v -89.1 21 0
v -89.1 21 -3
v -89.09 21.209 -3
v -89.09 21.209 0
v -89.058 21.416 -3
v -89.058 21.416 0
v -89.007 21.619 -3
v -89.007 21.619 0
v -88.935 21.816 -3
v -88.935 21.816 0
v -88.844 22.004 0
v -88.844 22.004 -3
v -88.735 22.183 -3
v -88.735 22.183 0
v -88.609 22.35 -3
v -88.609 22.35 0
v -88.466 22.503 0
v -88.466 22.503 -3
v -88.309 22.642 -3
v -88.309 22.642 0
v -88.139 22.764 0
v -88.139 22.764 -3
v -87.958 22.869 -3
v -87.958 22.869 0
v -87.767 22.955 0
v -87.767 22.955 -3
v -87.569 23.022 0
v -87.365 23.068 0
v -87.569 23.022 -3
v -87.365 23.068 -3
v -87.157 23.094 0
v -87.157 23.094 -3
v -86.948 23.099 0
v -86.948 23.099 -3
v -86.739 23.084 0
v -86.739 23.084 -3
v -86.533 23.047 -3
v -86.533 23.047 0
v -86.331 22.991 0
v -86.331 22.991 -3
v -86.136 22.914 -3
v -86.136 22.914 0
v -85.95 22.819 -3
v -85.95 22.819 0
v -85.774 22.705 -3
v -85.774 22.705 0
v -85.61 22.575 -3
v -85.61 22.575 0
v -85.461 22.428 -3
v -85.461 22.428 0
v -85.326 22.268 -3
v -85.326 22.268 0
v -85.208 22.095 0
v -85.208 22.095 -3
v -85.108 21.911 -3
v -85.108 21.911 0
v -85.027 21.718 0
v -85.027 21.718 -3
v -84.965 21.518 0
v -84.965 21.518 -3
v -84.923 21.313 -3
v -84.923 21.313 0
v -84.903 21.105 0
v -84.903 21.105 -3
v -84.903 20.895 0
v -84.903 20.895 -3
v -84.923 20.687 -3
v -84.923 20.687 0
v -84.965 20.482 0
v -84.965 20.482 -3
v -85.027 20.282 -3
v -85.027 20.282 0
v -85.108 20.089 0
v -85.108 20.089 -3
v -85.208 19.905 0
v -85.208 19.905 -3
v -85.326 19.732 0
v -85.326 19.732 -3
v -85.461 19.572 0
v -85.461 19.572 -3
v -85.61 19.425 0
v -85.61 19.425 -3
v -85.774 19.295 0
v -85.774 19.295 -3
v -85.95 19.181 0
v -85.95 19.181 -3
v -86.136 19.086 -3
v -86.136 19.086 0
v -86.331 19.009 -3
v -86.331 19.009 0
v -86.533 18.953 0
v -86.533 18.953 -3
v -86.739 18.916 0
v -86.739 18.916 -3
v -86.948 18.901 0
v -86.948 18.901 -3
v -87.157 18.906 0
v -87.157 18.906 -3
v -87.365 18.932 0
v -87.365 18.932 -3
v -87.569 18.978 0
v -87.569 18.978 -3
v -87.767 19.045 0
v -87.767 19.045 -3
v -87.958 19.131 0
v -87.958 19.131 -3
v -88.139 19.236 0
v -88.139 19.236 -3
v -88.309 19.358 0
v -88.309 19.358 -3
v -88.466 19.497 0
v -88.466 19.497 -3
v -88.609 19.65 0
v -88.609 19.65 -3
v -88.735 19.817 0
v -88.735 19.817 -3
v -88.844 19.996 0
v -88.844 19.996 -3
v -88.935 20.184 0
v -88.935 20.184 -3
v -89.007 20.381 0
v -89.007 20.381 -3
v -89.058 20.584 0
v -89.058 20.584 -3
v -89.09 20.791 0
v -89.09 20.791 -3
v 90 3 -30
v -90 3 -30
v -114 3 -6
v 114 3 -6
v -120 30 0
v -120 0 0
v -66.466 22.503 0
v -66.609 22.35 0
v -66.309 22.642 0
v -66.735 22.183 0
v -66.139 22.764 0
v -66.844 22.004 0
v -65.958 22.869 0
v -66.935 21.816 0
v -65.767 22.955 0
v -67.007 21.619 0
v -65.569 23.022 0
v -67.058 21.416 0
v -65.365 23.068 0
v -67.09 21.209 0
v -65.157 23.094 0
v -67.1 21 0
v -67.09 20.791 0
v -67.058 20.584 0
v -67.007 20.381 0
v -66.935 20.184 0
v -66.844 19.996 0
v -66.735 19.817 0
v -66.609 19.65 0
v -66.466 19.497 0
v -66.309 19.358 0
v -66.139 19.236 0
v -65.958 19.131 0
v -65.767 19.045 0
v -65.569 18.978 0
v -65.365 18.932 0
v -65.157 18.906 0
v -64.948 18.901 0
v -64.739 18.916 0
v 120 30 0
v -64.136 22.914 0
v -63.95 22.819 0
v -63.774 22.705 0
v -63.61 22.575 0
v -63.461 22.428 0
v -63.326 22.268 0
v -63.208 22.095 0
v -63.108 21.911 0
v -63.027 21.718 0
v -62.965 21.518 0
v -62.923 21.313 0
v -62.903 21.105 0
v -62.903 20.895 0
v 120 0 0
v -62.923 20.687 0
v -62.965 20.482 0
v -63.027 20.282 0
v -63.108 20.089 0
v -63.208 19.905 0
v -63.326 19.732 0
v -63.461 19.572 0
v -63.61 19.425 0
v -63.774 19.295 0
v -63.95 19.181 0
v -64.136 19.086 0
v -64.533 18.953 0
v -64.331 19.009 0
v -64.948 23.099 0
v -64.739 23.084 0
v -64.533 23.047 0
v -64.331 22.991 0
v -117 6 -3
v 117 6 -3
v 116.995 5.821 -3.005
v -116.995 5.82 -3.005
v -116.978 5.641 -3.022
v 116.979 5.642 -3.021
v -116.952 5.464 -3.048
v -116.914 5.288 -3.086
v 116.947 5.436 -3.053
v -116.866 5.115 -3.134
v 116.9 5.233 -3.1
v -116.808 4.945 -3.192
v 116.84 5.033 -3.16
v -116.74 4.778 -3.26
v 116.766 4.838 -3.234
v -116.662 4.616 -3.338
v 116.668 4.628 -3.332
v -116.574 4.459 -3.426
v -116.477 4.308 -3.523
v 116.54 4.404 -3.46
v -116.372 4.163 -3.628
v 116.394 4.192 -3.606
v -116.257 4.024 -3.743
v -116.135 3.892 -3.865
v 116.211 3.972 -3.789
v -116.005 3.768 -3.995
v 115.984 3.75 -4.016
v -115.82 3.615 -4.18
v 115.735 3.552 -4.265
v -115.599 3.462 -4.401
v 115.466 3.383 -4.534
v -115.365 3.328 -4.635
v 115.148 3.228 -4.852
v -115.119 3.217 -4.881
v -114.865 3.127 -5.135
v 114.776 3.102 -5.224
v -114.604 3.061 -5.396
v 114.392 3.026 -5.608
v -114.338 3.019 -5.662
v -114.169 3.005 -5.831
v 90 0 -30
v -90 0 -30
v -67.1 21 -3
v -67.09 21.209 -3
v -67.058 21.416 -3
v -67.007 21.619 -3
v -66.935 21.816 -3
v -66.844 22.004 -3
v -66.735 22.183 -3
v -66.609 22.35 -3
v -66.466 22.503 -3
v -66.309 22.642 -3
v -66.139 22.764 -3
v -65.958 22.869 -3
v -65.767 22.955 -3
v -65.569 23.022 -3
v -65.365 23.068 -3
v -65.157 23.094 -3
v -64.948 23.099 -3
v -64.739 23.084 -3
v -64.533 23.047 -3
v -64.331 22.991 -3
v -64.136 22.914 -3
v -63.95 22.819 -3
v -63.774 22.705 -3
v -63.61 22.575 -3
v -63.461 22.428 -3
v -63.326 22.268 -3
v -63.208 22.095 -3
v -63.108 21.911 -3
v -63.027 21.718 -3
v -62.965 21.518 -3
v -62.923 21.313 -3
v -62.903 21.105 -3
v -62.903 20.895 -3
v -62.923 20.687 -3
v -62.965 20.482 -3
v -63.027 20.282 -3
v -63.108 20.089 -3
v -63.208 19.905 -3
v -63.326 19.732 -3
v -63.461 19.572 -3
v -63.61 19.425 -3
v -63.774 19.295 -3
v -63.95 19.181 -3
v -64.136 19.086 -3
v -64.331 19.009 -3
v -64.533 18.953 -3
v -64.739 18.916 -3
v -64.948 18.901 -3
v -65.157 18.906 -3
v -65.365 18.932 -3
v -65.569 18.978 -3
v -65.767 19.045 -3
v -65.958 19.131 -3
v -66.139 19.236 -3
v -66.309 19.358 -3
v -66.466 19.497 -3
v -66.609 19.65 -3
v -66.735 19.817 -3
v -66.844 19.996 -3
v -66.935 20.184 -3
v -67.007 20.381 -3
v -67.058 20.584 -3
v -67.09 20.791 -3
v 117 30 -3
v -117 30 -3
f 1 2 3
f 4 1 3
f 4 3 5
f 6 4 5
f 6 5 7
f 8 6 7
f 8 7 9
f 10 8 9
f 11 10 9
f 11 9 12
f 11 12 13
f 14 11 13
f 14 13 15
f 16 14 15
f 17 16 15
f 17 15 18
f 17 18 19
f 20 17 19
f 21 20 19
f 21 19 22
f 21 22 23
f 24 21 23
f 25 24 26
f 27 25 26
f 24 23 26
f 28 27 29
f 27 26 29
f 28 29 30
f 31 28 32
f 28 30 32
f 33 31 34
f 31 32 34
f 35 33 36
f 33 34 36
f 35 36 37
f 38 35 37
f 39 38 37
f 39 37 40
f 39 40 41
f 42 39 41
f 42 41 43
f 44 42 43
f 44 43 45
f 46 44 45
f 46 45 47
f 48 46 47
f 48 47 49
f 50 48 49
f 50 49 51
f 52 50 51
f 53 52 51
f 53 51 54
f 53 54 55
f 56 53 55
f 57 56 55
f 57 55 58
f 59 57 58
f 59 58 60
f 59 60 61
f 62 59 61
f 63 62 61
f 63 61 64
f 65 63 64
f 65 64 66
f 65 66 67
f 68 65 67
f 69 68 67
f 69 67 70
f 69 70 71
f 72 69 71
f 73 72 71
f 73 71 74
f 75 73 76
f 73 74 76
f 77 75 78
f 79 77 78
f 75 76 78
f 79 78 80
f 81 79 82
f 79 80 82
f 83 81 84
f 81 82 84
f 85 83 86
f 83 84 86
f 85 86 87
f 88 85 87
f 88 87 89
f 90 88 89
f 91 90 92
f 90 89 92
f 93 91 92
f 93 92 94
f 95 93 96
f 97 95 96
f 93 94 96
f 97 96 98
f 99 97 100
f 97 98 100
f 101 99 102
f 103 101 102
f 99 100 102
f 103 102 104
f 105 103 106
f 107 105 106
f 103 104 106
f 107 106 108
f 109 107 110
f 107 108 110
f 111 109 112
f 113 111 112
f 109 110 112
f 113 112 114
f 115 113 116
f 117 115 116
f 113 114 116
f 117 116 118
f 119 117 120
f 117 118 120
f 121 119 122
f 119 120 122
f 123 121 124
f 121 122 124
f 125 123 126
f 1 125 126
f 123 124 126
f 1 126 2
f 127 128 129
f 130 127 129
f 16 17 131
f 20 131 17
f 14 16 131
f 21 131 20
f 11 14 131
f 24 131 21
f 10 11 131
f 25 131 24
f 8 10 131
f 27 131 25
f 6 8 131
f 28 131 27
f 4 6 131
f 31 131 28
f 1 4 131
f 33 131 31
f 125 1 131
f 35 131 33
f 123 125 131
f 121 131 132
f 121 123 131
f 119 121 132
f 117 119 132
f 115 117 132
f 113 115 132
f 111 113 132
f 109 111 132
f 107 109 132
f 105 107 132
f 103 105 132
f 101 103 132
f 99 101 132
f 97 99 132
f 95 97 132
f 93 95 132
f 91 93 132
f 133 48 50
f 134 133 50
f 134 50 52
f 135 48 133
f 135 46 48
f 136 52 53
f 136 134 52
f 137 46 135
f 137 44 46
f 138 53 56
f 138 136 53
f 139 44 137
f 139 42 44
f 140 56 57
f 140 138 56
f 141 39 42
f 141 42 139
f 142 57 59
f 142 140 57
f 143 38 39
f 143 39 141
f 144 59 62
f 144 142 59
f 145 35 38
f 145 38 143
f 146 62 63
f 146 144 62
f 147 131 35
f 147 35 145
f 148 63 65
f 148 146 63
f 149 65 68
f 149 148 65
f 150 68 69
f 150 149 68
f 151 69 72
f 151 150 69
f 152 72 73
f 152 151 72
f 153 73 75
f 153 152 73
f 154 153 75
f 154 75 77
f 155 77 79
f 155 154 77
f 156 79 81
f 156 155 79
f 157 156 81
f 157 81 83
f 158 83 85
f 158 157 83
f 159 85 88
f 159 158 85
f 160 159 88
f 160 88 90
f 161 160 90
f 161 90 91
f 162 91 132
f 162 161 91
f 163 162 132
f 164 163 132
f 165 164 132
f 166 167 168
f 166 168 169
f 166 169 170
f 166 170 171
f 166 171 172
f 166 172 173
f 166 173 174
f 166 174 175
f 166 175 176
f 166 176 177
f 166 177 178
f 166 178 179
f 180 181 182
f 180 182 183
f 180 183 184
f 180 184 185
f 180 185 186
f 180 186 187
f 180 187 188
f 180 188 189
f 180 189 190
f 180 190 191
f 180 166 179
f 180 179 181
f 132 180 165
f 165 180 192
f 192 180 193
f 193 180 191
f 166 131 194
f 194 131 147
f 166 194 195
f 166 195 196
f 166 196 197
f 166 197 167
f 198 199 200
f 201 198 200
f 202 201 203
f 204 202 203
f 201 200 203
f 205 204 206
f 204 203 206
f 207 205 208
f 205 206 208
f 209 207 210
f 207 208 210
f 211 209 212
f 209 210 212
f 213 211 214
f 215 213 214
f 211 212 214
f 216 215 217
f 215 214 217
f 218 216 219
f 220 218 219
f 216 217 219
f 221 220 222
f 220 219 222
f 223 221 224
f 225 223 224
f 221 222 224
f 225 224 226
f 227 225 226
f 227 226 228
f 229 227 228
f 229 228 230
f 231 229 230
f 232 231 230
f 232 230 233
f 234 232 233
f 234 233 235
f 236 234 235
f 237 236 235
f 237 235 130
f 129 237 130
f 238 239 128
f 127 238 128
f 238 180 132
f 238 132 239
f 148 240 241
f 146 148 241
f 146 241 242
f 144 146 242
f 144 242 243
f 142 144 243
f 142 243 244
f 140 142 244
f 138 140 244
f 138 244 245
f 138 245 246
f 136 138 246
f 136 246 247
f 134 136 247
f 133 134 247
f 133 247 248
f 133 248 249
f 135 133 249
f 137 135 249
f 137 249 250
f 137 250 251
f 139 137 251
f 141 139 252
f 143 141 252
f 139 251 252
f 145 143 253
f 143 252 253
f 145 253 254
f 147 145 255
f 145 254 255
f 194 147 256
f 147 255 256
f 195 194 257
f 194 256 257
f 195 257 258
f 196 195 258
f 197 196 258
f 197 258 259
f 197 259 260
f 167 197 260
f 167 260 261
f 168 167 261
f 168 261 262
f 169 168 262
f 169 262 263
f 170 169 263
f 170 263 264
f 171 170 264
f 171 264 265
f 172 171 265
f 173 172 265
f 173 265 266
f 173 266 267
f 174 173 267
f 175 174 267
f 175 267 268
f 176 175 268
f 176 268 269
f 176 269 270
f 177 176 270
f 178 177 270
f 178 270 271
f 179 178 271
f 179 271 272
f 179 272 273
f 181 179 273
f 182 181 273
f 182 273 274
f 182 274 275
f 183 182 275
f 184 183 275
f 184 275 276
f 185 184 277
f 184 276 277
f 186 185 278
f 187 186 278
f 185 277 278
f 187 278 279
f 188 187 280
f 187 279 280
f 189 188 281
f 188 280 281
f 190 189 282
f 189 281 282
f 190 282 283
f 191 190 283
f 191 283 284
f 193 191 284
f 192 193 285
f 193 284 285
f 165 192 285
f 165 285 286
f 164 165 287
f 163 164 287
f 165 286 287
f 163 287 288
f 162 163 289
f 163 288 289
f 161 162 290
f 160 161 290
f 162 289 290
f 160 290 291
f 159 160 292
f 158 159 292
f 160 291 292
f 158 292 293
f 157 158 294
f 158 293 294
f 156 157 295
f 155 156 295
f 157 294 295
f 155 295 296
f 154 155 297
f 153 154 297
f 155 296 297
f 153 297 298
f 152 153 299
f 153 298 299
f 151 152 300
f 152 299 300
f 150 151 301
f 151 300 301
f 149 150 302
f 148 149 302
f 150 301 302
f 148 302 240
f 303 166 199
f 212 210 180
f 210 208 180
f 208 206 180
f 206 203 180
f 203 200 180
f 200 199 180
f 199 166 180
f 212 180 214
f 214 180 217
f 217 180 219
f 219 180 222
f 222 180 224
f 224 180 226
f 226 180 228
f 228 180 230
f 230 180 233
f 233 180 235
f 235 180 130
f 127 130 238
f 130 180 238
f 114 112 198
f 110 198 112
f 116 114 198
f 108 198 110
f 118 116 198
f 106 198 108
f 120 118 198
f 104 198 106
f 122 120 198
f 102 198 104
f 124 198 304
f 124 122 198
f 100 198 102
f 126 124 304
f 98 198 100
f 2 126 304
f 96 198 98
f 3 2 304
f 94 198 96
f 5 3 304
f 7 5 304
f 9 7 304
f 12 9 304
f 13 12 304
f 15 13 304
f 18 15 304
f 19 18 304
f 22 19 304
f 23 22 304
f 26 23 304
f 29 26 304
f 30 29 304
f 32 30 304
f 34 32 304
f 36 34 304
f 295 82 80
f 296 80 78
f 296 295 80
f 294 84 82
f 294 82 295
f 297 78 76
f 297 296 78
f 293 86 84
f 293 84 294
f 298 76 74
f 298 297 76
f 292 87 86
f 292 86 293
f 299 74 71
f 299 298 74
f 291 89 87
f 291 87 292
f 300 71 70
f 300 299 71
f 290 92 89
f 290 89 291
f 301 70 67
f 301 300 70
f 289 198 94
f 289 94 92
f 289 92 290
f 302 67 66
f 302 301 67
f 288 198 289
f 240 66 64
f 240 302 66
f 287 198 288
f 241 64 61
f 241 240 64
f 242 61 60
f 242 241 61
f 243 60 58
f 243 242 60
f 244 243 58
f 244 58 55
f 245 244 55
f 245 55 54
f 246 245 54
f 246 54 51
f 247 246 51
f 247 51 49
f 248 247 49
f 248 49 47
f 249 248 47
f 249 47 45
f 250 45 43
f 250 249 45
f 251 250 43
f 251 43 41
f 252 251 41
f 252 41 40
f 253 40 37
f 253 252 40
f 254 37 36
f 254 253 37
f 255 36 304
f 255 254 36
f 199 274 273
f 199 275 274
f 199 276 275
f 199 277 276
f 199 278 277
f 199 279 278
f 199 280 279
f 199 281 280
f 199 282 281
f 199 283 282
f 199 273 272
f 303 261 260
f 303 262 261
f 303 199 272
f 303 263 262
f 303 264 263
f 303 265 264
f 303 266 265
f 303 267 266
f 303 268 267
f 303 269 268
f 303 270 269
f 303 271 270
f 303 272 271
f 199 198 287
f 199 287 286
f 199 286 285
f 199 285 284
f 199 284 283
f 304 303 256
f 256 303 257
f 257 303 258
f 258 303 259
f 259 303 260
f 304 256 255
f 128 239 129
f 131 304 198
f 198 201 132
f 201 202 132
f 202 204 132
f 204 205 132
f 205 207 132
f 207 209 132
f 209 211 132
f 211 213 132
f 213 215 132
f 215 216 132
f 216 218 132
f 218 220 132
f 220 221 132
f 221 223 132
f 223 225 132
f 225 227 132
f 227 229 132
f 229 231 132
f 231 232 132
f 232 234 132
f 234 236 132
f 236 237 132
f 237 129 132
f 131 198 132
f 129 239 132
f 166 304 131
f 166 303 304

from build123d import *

# Parameters (mm, degrees)
F1_DEPTH      = 120
F1_DEPTH_BACK = 120
F2_R          = 3
F4_DEPTH      = 30.001
F6_D          = 4.2


with BuildPart() as f1:
    # F0 (on Right) → F1 (new body, two sides)
    with BuildSketch(Plane.YZ) as f1_sk:
        Polygon((0, 0), (0, -30), (3, -30), (3, -3), (30, -3), (30, 0), align=None)
    extrude(amount=F1_DEPTH)
    extrude(f1_sk.sketch, amount=-F1_DEPTH_BACK)

    # F2
    f2_edges = [f1.edges().sort_by_distance(p)[0] for p in [
        (0, 3, -3),
    ]]
    fillet(f2_edges, radius=F2_R)

    # F3 (on face) → F4 (cut, through all)
    with BuildSketch(Plane.XZ):
        Polygon((-80, -40), (-130, 10), (-130, -40), align=None)
        Polygon((130, -40), (130, 10), (80, -40), align=None)
    extrude(amount=-F4_DEPTH, mode=Mode.SUBTRACT)

    # F6 (through all)
    with Locations(Plane.XY):
        with Locations((-87, 21), (-65, 21)):
            Hole(F6_D / 2)


solid = f1.part
